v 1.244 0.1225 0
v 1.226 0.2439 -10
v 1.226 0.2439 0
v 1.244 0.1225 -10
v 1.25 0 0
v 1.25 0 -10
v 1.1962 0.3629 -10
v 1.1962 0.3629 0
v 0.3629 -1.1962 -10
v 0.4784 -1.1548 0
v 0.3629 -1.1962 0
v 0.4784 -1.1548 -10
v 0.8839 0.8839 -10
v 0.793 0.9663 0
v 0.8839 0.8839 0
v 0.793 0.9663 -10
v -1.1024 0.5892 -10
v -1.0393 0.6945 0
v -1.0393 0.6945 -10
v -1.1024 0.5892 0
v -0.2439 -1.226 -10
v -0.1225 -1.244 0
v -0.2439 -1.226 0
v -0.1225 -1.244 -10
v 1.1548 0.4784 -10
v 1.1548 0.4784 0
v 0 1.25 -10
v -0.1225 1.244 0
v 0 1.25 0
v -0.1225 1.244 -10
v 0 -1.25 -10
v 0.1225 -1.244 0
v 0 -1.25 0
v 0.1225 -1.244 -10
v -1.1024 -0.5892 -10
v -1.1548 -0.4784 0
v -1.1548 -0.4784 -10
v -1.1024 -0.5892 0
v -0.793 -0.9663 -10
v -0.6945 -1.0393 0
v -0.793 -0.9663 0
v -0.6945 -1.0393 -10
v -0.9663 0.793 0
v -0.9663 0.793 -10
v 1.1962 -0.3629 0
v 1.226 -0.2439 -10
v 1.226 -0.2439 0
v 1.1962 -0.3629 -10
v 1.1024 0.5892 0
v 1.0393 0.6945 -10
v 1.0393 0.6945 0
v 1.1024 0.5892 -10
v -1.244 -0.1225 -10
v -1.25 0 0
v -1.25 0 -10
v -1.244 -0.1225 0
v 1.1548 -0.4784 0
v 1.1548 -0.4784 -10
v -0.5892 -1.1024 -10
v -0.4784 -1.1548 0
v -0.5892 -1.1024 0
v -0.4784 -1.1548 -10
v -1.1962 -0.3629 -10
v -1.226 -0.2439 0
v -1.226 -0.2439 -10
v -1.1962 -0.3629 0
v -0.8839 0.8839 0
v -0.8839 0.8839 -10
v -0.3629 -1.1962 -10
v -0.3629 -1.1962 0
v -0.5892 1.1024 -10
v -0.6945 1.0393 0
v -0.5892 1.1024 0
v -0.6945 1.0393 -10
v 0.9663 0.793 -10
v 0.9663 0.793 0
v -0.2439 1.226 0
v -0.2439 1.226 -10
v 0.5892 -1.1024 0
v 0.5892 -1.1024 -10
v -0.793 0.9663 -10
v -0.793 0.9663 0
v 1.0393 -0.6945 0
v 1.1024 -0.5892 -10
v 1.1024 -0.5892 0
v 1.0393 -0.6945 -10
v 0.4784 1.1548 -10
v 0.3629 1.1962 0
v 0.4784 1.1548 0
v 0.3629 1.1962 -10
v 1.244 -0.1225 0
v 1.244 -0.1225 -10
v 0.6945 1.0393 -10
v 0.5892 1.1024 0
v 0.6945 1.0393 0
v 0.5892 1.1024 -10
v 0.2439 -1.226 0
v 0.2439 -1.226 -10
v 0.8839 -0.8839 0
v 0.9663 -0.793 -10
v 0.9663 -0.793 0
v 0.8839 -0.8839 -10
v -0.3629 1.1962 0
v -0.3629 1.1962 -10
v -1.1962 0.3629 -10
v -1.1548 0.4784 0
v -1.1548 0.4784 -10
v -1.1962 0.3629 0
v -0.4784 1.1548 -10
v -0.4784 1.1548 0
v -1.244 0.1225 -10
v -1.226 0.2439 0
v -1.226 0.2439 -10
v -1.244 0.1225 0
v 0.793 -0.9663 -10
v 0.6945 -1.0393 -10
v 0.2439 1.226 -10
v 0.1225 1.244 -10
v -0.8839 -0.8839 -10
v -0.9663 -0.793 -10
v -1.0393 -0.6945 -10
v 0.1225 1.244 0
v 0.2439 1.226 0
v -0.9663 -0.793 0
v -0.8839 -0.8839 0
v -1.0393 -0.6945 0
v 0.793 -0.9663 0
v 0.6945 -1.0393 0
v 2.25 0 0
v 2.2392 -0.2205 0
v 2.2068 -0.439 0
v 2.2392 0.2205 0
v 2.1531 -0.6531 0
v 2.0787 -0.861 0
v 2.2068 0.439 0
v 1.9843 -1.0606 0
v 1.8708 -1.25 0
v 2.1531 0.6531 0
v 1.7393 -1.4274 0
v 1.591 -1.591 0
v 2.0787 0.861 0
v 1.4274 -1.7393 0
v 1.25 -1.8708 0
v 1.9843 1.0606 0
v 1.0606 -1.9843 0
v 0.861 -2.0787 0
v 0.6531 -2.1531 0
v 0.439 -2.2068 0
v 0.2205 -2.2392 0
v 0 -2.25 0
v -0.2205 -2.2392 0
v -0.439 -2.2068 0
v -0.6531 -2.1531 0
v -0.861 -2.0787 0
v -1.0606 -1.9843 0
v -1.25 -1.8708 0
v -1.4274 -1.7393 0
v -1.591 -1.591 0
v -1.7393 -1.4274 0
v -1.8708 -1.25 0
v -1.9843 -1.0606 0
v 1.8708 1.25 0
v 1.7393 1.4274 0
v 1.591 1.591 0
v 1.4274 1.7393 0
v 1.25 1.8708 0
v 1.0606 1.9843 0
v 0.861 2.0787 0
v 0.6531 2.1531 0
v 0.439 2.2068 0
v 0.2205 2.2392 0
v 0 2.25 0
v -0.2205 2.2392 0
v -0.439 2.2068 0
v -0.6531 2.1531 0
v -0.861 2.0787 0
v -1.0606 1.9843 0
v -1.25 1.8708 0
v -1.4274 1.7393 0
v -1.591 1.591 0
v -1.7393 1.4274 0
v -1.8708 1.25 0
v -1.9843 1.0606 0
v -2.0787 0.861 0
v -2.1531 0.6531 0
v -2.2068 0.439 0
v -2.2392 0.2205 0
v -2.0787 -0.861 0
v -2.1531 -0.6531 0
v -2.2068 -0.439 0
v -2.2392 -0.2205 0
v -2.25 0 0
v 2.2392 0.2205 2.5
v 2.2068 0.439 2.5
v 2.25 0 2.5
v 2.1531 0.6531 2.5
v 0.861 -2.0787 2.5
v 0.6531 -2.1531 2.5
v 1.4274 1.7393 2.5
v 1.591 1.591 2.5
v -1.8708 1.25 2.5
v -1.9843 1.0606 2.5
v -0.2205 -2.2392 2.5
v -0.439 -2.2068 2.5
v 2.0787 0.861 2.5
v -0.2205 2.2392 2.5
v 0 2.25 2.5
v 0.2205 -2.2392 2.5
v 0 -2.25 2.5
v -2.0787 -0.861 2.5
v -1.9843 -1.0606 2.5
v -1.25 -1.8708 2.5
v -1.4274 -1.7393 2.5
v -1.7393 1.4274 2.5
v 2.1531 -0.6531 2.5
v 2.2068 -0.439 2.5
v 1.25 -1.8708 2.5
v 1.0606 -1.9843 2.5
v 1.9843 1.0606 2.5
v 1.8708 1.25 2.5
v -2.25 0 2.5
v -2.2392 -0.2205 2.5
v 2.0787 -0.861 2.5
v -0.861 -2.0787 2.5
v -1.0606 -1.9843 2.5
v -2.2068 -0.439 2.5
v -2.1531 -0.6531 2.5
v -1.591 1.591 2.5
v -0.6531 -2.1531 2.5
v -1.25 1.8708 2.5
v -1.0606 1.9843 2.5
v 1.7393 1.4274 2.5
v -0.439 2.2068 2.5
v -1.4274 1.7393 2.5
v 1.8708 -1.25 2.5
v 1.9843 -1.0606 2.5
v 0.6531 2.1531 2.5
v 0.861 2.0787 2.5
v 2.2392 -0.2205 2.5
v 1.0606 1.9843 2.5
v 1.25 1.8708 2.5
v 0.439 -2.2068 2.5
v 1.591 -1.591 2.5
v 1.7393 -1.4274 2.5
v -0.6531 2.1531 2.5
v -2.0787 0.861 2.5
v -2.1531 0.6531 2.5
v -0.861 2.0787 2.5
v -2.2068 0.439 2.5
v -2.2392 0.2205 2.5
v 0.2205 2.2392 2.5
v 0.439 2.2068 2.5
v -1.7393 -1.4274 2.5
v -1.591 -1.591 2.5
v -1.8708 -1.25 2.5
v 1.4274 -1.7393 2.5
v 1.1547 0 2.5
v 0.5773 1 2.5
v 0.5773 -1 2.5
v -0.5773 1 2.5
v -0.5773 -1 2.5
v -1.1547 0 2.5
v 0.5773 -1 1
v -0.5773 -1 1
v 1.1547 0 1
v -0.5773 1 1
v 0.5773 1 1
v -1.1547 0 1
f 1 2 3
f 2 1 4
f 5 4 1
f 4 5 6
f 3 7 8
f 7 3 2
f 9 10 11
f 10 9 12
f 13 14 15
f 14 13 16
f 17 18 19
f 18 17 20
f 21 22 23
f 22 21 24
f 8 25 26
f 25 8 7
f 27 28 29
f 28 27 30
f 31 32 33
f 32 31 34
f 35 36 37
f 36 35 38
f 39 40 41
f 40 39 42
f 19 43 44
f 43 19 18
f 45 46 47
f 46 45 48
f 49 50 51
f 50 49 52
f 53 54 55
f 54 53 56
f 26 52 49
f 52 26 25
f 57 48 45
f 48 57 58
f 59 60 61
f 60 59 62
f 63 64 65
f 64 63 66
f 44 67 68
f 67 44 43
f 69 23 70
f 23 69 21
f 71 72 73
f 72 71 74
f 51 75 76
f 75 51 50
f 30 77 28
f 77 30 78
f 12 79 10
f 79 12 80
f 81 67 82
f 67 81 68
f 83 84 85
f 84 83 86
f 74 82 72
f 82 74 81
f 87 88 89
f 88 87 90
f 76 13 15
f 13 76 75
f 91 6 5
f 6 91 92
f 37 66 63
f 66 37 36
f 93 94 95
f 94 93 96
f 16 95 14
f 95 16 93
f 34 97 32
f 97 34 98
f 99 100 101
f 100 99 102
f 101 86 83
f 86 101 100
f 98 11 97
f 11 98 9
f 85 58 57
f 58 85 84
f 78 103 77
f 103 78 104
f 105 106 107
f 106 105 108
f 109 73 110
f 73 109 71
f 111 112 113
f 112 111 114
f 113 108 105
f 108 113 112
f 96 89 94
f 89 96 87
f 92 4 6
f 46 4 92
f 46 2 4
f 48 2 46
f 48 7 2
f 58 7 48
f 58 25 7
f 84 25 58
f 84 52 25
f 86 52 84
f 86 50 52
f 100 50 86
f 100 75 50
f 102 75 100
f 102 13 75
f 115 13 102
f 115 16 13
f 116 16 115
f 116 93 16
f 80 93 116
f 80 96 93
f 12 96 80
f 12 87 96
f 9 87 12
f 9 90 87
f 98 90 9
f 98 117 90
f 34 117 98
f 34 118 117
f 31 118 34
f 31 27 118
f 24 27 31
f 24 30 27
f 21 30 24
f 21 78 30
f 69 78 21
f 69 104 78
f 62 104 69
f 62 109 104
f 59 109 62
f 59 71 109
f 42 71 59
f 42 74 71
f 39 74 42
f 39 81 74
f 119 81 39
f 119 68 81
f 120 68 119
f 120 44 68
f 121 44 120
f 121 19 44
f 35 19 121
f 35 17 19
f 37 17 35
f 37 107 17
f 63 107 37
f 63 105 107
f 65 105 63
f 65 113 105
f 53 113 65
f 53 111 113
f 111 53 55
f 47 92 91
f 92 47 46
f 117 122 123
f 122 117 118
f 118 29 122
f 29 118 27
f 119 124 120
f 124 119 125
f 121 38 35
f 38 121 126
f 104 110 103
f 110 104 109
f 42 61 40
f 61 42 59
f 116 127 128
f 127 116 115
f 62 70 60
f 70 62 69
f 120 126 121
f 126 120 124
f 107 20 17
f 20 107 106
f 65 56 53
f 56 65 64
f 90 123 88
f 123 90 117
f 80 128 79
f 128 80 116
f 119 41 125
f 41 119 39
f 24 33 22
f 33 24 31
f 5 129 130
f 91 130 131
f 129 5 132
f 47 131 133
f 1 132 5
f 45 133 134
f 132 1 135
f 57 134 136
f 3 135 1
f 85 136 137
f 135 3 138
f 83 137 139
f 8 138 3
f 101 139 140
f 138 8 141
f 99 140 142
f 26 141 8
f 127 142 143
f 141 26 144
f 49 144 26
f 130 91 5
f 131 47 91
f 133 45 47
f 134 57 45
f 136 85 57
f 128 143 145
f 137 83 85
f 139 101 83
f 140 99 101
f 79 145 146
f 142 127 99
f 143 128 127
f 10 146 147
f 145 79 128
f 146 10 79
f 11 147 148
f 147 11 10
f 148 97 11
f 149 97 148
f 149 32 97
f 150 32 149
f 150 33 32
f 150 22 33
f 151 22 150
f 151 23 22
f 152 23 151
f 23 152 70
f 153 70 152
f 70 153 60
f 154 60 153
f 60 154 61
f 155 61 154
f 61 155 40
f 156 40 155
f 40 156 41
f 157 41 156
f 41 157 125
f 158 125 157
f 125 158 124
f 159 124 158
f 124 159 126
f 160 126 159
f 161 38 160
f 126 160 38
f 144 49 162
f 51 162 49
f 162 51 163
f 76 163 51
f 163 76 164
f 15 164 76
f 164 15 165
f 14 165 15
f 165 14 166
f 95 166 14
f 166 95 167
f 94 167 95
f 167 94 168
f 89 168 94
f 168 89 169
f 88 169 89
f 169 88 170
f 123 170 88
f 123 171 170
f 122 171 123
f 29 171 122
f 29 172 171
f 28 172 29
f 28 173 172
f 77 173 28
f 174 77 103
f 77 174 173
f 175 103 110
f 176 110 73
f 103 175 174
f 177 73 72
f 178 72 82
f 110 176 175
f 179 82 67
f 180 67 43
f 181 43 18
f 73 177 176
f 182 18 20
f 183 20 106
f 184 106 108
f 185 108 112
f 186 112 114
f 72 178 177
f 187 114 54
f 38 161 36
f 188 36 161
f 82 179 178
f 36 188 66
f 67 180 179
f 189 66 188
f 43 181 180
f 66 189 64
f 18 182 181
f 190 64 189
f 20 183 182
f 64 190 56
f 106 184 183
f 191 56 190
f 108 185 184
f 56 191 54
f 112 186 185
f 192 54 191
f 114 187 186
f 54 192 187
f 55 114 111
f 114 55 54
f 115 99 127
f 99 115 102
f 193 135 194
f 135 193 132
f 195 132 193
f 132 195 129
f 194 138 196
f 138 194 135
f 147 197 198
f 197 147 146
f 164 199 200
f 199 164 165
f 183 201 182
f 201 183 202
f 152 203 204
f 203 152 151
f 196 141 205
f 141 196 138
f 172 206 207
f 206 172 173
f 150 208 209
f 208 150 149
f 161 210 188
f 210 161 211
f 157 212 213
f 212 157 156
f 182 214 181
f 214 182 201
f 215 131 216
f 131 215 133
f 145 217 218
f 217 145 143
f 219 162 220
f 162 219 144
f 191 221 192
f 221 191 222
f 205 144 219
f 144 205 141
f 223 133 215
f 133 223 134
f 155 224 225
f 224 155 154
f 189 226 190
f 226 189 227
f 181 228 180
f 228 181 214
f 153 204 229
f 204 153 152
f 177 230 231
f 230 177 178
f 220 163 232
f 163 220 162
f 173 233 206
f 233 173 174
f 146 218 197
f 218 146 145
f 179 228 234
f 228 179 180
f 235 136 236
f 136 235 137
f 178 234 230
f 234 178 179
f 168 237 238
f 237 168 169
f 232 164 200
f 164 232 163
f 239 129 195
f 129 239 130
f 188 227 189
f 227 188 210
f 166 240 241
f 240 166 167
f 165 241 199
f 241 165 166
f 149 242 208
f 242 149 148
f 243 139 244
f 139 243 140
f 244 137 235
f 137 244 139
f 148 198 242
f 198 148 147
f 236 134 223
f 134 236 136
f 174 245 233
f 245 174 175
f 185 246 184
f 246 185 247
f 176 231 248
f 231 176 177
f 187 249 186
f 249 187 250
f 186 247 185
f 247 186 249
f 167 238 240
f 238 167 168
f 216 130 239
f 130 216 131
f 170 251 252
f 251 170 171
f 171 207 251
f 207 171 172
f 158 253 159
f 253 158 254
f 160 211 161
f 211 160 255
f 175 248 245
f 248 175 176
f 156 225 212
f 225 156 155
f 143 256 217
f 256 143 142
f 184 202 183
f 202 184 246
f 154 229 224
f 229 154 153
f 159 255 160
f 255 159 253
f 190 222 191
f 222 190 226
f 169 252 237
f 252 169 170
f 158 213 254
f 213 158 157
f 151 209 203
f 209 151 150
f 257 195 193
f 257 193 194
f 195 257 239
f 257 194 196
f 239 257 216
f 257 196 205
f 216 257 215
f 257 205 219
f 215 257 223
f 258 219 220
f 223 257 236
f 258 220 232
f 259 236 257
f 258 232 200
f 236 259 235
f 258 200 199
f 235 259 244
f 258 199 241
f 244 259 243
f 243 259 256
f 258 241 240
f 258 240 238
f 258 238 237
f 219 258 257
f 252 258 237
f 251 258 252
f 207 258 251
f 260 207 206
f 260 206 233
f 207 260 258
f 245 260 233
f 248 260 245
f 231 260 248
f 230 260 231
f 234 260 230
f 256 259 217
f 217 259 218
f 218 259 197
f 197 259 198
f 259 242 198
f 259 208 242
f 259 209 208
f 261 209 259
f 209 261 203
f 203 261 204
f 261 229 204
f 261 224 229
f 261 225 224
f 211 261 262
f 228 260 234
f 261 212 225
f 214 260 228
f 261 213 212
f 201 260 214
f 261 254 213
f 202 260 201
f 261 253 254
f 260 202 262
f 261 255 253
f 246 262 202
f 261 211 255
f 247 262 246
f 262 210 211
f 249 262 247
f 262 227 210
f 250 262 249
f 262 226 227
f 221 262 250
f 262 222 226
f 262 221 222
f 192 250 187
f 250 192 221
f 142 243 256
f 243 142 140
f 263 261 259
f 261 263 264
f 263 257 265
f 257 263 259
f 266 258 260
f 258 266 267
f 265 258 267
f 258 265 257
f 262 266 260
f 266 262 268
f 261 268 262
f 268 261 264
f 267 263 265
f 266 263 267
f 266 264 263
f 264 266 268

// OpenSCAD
// Socket head cap screw (single connected solid)
// Specs: shank Ø2.5mm, head Ø4.5mm, head height 2.5mm, length under head 10mm

shank_diameter_mm      = 2.5;
length_under_head_mm   = 10;
head_diameter_mm       = 4.5;
head_height_mm         = 2.5;

// Hex socket (typical for M2.5 is ~2.0mm AF; keep as given)
hex_socket_af_mm       = 2.0;
hex_socket_depth_mm    = 1.5;

// Small overlap to ensure watertight boolean operations
overlap_mm             = 0.05;

$fn = 64;

module socket_head_cap_screw() {
    shank_r = shank_diameter_mm/2;
    head_r  = head_diameter_mm/2;

    // Convert across-flats (AF) to circumscribed radius for a hex polygon
    hex_r = (hex_socket_af_mm/2) / cos(30);

    difference() {
        union() {
            // Shank: from z = -length_under_head to z = 0 (under head)
            translate([0, 0, -length_under_head_mm/2])
                cylinder(r=shank_r, h=length_under_head_mm, center=true);

            // Head: from z = 0 to z = head_height
            translate([0, 0, head_height_mm/2])
                cylinder(r=head_r, h=head_height_mm, center=true);
        }

        // Hex socket recess: cut from top face downward
        // Top face at z = head_height_mm
        translate([0, 0, head_height_mm - hex_socket_depth_mm/2 + overlap_mm/2])
            cylinder(r=hex_r, h=hex_socket_depth_mm + overlap_mm, center=true, $fn=6);
    }
}

socket_head_cap_screw();
